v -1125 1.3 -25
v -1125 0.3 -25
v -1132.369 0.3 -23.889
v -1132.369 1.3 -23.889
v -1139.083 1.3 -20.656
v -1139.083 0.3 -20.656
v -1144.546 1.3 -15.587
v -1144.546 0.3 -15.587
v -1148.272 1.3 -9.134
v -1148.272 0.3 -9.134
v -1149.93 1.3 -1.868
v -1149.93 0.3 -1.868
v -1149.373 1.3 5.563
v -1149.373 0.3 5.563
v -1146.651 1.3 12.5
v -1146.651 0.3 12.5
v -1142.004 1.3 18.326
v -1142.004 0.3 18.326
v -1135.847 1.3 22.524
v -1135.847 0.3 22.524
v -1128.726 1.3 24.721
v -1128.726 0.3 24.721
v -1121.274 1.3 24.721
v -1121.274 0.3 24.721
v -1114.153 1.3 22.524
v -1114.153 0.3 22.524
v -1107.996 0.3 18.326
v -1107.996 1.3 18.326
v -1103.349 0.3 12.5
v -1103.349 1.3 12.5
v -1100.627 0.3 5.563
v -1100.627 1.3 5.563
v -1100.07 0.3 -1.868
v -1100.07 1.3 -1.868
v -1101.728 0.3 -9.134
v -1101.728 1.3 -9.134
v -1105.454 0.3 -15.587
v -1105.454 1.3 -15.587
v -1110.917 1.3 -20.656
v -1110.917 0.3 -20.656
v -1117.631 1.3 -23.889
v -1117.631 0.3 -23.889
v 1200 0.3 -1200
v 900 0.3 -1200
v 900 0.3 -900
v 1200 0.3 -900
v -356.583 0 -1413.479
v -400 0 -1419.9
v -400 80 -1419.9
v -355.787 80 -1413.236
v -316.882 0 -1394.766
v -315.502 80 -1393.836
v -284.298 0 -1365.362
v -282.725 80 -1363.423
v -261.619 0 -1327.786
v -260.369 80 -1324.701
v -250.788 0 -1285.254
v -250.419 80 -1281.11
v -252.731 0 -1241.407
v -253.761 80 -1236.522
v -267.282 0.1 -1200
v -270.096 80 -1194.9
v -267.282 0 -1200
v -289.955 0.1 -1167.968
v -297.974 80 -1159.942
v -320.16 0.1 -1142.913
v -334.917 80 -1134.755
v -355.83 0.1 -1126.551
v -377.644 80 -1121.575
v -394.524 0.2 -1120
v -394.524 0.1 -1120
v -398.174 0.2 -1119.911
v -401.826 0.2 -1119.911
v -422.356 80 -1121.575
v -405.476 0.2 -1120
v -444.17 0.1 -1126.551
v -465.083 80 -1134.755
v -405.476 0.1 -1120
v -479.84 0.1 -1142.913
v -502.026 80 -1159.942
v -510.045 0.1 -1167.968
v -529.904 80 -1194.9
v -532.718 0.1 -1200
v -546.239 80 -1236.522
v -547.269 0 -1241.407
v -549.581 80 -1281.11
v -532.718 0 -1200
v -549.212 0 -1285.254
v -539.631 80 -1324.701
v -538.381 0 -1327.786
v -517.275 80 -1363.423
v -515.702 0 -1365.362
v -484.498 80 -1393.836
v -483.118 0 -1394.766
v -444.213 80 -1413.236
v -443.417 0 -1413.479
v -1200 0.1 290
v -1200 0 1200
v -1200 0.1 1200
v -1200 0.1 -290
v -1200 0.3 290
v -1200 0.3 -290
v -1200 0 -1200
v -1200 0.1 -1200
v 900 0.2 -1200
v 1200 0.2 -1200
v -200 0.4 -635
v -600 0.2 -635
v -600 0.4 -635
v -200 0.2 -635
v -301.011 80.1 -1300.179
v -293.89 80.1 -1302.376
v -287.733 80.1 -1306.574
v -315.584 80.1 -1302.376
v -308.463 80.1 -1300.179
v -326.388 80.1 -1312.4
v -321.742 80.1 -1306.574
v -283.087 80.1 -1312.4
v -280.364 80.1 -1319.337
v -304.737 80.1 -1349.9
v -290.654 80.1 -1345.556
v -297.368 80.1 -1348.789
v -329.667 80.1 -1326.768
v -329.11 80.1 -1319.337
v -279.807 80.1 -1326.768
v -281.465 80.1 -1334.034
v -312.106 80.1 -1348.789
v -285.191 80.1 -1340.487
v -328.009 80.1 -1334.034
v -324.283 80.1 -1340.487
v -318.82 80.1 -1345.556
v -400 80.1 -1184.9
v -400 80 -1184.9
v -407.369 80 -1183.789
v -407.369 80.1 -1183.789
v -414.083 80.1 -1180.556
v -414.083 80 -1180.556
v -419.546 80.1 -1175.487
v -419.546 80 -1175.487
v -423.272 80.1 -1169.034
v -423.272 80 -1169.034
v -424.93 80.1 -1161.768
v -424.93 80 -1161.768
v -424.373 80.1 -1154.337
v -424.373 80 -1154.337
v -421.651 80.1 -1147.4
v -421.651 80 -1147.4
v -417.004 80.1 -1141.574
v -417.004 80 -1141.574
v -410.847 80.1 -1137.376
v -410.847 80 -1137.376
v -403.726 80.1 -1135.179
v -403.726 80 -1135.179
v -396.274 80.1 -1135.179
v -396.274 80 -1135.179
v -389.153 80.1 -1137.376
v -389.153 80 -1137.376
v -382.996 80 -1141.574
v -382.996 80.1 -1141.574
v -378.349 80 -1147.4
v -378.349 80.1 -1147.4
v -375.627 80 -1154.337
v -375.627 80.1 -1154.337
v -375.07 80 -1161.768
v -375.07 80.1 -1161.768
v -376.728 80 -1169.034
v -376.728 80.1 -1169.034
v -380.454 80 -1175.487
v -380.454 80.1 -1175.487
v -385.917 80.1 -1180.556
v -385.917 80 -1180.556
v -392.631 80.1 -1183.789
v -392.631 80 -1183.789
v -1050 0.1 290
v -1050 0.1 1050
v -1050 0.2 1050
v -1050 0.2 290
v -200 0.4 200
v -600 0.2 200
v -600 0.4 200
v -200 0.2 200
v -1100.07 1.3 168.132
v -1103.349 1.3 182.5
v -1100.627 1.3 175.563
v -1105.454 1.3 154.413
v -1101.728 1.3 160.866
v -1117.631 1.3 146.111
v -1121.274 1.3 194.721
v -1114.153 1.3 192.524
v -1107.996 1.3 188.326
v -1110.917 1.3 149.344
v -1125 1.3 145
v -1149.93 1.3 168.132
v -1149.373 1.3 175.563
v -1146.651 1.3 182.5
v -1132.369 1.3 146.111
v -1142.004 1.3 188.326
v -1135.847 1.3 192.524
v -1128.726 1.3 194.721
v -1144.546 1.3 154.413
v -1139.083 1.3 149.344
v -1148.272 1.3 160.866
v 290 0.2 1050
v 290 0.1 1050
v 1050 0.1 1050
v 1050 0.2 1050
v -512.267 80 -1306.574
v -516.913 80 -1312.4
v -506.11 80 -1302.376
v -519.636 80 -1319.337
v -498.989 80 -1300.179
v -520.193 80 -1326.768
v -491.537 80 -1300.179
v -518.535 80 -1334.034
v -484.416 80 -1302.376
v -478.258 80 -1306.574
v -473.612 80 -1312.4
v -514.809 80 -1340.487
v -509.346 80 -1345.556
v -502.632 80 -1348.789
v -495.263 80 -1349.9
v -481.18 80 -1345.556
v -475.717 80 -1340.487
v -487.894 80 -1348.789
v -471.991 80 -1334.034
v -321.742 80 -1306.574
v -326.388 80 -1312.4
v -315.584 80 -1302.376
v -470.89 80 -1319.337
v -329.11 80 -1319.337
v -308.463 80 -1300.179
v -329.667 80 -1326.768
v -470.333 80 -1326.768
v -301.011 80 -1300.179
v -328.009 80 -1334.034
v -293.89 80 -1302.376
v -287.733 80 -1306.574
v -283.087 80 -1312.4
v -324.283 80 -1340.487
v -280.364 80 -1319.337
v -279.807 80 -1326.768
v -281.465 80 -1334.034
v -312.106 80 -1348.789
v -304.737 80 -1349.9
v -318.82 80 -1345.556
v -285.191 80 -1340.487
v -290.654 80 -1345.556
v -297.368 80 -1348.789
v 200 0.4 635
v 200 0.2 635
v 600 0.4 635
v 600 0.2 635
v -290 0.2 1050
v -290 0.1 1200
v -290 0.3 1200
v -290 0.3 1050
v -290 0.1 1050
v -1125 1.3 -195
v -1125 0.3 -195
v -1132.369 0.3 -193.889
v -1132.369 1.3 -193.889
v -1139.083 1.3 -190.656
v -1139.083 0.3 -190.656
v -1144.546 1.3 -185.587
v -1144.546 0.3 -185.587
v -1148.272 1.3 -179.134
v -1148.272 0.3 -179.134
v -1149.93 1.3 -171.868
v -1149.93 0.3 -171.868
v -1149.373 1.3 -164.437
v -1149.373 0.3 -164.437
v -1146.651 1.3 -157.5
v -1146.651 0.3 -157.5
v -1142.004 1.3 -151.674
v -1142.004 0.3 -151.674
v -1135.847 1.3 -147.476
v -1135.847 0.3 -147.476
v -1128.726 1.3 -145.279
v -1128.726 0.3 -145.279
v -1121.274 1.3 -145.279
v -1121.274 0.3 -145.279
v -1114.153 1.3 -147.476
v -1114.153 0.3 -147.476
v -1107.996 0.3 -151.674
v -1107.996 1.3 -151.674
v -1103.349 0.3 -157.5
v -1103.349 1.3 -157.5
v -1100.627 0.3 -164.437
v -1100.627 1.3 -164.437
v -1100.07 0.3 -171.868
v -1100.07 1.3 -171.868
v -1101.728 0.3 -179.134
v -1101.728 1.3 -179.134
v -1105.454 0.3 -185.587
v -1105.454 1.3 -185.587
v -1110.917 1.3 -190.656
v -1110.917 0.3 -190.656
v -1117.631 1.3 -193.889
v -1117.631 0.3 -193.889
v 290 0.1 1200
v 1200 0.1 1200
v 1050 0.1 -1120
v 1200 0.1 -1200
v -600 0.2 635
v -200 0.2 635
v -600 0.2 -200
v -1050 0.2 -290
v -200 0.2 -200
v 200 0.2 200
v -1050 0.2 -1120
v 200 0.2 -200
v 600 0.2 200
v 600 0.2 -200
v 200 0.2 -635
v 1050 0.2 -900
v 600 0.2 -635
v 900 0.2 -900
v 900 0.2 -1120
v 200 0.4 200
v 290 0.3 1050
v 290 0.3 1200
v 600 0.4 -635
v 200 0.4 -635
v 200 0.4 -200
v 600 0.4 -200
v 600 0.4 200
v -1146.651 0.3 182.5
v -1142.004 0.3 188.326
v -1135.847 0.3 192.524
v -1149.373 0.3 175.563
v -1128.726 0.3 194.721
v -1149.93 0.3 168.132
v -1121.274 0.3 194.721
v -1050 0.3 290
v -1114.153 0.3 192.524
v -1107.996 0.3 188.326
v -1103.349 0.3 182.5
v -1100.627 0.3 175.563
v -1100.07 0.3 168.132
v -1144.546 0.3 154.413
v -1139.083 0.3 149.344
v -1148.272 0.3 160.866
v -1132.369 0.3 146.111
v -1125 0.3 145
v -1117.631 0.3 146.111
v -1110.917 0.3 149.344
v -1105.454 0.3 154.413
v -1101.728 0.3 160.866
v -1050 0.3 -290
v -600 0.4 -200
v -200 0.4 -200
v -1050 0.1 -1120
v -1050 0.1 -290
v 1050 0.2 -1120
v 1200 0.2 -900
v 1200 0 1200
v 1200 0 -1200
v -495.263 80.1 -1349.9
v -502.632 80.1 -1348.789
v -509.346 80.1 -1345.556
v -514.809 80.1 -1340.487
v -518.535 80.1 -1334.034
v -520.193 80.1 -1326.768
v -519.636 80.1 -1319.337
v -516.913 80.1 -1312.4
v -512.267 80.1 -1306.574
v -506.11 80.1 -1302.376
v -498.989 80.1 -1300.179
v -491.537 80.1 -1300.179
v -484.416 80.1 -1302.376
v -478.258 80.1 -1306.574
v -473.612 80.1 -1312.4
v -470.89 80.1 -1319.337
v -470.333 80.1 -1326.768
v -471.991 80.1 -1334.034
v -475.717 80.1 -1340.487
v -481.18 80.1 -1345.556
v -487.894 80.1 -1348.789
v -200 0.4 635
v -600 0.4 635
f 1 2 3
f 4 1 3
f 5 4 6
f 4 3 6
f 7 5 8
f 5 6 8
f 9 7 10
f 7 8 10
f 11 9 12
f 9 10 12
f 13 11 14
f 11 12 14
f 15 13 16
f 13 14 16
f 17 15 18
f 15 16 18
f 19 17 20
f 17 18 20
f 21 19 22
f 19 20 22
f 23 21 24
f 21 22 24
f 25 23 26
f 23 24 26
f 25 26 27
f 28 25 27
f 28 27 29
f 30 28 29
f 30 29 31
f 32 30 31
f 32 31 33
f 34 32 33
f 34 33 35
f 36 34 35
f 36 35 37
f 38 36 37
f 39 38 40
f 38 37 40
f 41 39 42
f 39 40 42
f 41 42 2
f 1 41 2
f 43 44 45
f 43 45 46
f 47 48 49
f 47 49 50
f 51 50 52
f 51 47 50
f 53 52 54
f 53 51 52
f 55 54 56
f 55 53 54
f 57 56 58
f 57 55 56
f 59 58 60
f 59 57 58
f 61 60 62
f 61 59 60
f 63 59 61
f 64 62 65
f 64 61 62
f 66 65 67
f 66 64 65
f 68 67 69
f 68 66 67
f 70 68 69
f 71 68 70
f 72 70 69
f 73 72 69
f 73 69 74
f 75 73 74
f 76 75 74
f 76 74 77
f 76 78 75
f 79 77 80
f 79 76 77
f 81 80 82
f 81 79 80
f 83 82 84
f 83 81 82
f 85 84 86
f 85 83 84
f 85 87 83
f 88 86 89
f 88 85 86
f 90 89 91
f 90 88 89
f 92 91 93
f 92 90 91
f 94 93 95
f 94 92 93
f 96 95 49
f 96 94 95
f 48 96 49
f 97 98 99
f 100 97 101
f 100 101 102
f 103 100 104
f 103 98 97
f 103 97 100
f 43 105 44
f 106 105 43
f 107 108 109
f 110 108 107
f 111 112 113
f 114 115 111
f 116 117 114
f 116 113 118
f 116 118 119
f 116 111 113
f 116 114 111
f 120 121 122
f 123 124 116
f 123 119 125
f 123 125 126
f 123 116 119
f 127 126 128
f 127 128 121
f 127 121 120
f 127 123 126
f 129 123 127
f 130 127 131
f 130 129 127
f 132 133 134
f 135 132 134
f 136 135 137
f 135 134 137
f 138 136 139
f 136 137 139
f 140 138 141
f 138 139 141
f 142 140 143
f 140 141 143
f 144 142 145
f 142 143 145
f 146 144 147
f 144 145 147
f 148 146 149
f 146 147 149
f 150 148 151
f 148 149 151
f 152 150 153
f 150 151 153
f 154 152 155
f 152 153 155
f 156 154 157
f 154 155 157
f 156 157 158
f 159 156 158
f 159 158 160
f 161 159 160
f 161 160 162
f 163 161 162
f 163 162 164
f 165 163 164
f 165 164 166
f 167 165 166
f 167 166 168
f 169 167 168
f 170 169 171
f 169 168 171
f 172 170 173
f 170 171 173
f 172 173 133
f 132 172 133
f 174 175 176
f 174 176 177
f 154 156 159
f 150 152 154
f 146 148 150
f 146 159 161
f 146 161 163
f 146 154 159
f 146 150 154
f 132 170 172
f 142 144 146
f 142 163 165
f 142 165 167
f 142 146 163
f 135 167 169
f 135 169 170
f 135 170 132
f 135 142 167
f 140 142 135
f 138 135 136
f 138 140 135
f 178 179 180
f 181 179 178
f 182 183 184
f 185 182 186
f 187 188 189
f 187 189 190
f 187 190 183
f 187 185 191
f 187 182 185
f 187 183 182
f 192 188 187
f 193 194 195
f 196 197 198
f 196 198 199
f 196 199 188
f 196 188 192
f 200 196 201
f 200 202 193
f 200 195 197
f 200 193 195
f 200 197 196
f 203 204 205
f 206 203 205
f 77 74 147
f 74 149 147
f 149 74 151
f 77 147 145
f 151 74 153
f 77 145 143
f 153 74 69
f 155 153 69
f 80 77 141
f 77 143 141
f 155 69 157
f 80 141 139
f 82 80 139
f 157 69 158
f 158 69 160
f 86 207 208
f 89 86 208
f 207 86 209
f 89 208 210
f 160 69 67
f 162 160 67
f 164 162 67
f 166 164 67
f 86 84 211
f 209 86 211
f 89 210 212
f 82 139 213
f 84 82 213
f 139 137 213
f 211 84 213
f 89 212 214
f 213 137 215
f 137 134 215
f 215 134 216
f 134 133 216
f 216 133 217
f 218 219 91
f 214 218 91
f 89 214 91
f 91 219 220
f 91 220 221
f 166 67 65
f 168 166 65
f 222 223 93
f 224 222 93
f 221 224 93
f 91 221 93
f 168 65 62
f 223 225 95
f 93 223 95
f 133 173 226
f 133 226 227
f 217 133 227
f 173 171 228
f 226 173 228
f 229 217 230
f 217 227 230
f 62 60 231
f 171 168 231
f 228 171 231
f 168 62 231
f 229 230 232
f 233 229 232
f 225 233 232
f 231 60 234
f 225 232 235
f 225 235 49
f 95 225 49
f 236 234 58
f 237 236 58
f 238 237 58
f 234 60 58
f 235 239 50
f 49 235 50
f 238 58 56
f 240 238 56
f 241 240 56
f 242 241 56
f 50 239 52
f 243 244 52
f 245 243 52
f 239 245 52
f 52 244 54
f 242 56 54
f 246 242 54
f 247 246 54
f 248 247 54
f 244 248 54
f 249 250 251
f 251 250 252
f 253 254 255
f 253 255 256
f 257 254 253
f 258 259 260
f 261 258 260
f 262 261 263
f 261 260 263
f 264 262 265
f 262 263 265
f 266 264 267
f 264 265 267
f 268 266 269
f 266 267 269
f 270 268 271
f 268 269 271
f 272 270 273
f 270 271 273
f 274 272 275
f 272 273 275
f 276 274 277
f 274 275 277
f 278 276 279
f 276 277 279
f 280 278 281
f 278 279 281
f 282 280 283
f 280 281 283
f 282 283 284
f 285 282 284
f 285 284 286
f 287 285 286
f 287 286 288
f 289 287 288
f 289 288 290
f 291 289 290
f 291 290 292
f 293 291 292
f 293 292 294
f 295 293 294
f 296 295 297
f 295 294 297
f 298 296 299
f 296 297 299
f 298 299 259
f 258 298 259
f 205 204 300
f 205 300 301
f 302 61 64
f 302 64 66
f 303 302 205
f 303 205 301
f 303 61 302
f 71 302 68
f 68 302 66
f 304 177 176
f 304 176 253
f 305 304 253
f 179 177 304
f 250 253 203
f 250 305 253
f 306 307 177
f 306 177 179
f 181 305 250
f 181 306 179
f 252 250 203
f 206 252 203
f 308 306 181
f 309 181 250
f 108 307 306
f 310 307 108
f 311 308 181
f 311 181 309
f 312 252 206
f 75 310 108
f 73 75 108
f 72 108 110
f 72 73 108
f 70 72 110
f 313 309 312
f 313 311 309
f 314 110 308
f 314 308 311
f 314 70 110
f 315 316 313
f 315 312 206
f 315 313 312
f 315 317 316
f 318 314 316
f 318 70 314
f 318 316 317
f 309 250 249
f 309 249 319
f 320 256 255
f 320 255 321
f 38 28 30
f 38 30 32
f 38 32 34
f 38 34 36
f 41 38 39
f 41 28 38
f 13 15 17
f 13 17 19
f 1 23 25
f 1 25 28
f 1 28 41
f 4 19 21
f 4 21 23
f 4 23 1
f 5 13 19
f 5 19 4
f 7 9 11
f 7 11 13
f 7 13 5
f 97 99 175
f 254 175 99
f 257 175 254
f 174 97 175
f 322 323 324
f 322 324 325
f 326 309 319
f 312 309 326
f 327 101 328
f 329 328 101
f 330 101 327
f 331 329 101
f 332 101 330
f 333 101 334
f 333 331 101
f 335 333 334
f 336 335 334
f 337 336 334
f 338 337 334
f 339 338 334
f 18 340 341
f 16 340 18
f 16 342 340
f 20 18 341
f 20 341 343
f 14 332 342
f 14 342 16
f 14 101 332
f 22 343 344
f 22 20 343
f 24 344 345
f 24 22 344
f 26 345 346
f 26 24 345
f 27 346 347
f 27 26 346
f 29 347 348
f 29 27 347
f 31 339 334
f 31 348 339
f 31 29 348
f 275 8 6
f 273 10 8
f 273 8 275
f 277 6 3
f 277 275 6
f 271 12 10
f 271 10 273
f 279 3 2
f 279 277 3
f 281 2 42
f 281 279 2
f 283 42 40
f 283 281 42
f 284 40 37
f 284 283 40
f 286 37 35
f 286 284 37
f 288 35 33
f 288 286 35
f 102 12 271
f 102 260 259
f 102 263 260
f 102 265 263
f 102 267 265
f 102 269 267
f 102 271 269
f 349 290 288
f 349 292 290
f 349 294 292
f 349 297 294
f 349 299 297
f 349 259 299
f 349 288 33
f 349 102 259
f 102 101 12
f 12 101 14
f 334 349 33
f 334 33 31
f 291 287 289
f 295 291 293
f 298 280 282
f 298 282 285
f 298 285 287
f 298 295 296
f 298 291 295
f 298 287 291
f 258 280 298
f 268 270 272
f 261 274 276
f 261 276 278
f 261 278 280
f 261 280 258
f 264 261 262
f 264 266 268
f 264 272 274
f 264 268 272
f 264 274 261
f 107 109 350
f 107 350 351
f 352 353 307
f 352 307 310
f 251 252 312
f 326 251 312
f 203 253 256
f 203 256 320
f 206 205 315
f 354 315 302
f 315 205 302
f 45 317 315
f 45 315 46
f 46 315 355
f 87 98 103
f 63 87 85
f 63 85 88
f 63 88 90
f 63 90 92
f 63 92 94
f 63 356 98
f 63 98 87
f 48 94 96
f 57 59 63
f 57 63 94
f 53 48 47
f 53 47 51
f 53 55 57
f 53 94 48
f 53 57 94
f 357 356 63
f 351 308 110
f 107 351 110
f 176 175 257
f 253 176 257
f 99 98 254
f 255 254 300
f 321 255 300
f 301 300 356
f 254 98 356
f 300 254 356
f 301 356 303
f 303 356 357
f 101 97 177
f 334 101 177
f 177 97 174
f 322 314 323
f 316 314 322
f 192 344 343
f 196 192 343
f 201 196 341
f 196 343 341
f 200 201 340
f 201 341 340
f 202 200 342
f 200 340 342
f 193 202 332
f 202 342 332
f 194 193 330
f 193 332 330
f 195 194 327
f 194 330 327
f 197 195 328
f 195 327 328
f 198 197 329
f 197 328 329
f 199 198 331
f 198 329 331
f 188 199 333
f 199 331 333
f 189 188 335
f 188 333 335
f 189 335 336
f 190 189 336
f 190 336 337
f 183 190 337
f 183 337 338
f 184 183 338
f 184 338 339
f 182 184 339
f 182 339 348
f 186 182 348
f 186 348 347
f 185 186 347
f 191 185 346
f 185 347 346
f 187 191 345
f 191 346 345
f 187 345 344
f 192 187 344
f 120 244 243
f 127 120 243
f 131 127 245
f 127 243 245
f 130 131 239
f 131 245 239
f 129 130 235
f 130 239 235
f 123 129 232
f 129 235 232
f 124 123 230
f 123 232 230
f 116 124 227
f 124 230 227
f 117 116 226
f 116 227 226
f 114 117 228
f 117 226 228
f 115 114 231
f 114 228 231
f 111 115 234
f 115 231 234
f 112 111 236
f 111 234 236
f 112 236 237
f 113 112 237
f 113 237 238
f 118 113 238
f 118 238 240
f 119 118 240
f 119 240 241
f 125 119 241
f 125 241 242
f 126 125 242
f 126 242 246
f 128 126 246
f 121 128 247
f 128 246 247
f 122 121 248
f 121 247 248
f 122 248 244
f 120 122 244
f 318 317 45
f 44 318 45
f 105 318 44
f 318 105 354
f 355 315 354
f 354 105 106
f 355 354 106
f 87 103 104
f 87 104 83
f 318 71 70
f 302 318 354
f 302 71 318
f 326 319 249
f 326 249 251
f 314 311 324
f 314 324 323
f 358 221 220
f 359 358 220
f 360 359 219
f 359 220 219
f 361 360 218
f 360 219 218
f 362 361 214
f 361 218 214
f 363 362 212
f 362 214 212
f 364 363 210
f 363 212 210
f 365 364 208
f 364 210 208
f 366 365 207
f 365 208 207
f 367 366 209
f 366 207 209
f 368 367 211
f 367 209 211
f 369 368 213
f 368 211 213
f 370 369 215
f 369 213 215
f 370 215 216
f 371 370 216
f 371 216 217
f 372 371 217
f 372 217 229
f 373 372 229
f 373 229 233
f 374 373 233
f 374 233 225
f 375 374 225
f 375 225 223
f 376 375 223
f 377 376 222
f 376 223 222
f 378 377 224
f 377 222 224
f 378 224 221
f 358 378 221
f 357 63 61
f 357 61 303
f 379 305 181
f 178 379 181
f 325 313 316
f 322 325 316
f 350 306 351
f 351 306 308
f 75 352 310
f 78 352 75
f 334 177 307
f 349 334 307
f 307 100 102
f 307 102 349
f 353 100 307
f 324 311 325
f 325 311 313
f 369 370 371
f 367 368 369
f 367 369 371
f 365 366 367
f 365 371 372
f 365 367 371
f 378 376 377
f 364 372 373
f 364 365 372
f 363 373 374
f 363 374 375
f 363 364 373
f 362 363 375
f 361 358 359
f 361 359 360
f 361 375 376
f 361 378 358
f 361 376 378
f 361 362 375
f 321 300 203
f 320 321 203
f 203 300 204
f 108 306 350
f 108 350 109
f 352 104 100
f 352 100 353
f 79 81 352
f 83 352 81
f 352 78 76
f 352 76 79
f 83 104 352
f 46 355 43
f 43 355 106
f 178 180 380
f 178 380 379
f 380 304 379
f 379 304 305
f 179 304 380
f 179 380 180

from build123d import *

# Parameters (mm, degrees)
SKETCH_1_W       = 2400
SKETCH_1_H       = 2400
EXTRUDE_1_DEPTH  = 0.1
SKETCH_3_W       = 2100
SKETCH_3_H       = 2170
SKETCH_3_W_2     = 1200
SKETCH_3_H_2     = 1270
SKETCH_3_W_3     = 400
SKETCH_3_H_3     = 435
SKETCH_3_H_4     = 400
EXTRUDE_5_DEPTH  = 0.1
SKETCH_4_W       = 300
SKETCH_4_H       = 300
EXTRUDE_7_DEPTH  = 0.1
SKETCH_5_W       = 580
SKETCH_5_H       = 150
EXTRUDE_9_DEPTH  = 0.2
SKETCH_6_W       = 150
SKETCH_6_H       = 580
EXTRUDE_10_DEPTH = 0.2
SKETCH_7_W       = 400
SKETCH_7_H       = 435
EXTRUDE_11_DEPTH = 0.2
SKETCH_10_R      = 150
EXTRUDE_14_DEPTH = 80
SKETCH_11_R      = 25
EXTRUDE_15_DEPTH = 0.1
SKETCH_12_R      = 25
EXTRUDE_16_DEPTH = 1


with BuildPart() as part:
    # 草图1 → 凸台-拉伸1 (new body)
    with BuildSketch(Plane(origin=(0, 0, 0), x_dir=(1, 0, 0), z_dir=(0, 1, 0))):
        Rectangle(SKETCH_1_W, SKETCH_1_H)
    extrude(amount=EXTRUDE_1_DEPTH)

    # 草图3 → 凸台-拉伸5 (add)
    # profile 1 of 10: a face of its own
    with BuildSketch(Plane(origin=(0, 0.1, 0), x_dir=(1, 0, 0), z_dir=(0, 1, 0))):
        with Locations((0, 35)):
            Rectangle(SKETCH_3_W, SKETCH_3_H)
        Rectangle(SKETCH_3_W_2, SKETCH_3_H_2, mode=Mode.SUBTRACT)
    # profile 2 of 10: a face of its own
    with BuildSketch(Plane(origin=(0, 0.1, 0), x_dir=(1, 0, 0), z_dir=(0, 1, 0))):
        with Locations((0, 417.5)):
            Rectangle(SKETCH_3_W_3, SKETCH_3_H_3)
    # profile 3 of 10: a face of its own
    with BuildSketch(Plane(origin=(0, 0.1, 0), x_dir=(1, 0, 0), z_dir=(0, 1, 0))):
        with Locations((0, -417.5)):
            Rectangle(SKETCH_3_W_3, SKETCH_3_H_3)
    # profile 4 of 10: a face of its own
    with BuildSketch(Plane(origin=(0, 0.1, 0), x_dir=(1, 0, 0), z_dir=(0, 1, 0))):
        with Locations((-400, 0)):
            Rectangle(SKETCH_3_W_3, SKETCH_3_H_4)
    # profile 5 of 10: a face of its own
    with BuildSketch(Plane(origin=(0, 0.1, 0), x_dir=(1, 0, 0), z_dir=(0, 1, 0))):
        with Locations((400, 0)):
            Rectangle(SKETCH_3_W_3, SKETCH_3_H_4)
    # profile 6 of 10: a face of its own
    with BuildSketch(Plane(origin=(0, 0.1, 0), x_dir=(1, 0, 0), z_dir=(0, 1, 0))):
        with Locations((-400, -417.5)):
            Rectangle(SKETCH_3_W_3, SKETCH_3_H_3)
    # profile 7 of 10: a face of its own
    with BuildSketch(Plane(origin=(0, 0.1, 0), x_dir=(1, 0, 0), z_dir=(0, 1, 0))):
        Rectangle(SKETCH_3_W_3, SKETCH_3_H_4)
    # profile 8 of 10: a face of its own
    with BuildSketch(Plane(origin=(0, 0.1, 0), x_dir=(1, 0, 0), z_dir=(0, 1, 0))):
        with Locations((-400, 417.5)):
            Rectangle(SKETCH_3_W_3, SKETCH_3_H_3)
    # profile 9 of 10: a face of its own
    with BuildSketch(Plane(origin=(0, 0.1, 0), x_dir=(1, 0, 0), z_dir=(0, 1, 0))):
        with Locations((400, 417.5)):
            Rectangle(SKETCH_3_W_3, SKETCH_3_H_3)
    # profile 10 of 10: a face of its own
    with BuildSketch(Plane(origin=(0, 0.1, 0), x_dir=(1, 0, 0), z_dir=(0, 1, 0))):
        with Locations((400, -417.5)):
            Rectangle(SKETCH_3_W_3, SKETCH_3_H_3)
    extrude(amount=EXTRUDE_5_DEPTH)

    # 草图4 → 凸台-拉伸7 (add)
    with BuildSketch(Plane(origin=(0, 0.2, 0), x_dir=(1, 0, 0), z_dir=(0, 1, 0))):
        with Locations((1050, 1050)):
            Rectangle(SKETCH_4_W, SKETCH_4_H)
    extrude(amount=EXTRUDE_7_DEPTH)

    # 草图5 → 凸台-拉伸9 (add)
    with BuildSketch(Plane(origin=(0, 0.1, 0), x_dir=(1, 0, 0), z_dir=(0, 1, 0))):
        with Locations((0, -1125)):
            Rectangle(SKETCH_5_W, SKETCH_5_H)
    extrude(amount=EXTRUDE_9_DEPTH)

    # 草图6 → 凸台-拉伸10 (add)
    with BuildSketch(Plane(origin=(0, 0.1, 0), x_dir=(1, 0, 0), z_dir=(0, 1, 0))):
        with Locations((-1125, 0)):
            Rectangle(SKETCH_6_W, SKETCH_6_H)
    extrude(amount=EXTRUDE_10_DEPTH)

    # 草图7 → 凸台-拉伸11 (add)
    with BuildSketch(Plane(origin=(0, 0.2, 0), x_dir=(1, 0, 0), z_dir=(0, 1, 0))):
        with Locations((400, 417.5)):
            Rectangle(SKETCH_7_W, SKETCH_7_H)
        with Locations((400, -417.5)):
            Rectangle(SKETCH_7_W, SKETCH_7_H)
        with Locations((-400, -417.5)):
            Rectangle(SKETCH_7_W, SKETCH_7_H)
        with Locations((-400, 417.5)):
            Rectangle(SKETCH_7_W, SKETCH_7_H)
    extrude(amount=EXTRUDE_11_DEPTH)

    # 草图10 → 凸台-拉伸14 (add)
    with BuildSketch(Plane.XZ):
        with Locations(Location((-400, -1269.9, 0), (0, 0, 270))):
            Circle(SKETCH_10_R)
    extrude(amount=-EXTRUDE_14_DEPTH)

    # 草图11 → 凸台-拉伸15 (add)
    with BuildSketch(Plane(origin=(0, 80, 0), x_dir=(1, 0, 0), z_dir=(0, 1, 0))):
        with Locations(Location((-495.262794416, 1324.9, 0), (0, 0, 90))):
            Circle(SKETCH_11_R)
        with Locations(Location((-400, 1159.9, 0), (0, 0, 90))):
            Circle(SKETCH_11_R)
        with Locations(Location((-304.737205584, 1324.9, 0), (0, 0, 90))):
            Circle(SKETCH_11_R)
    extrude(amount=EXTRUDE_15_DEPTH)

    # 草图12 → 凸台-拉伸16 (add)
    with BuildSketch(Plane(origin=(0, 0.3, 0), x_dir=(1, 0, 0), z_dir=(0, 1, 0))):
        with Locations(Location((-1125, 0, 0), (0, 0, 90))):
            Circle(SKETCH_12_R)
        with Locations(Location((-1125, 170, 0), (0, 0, 90))):
            Circle(SKETCH_12_R)
        with Locations(Location((-1125, -170, 0), (0, 0, 90))):
            Circle(SKETCH_12_R)
    extrude(amount=EXTRUDE_16_DEPTH)


solid = part.part
